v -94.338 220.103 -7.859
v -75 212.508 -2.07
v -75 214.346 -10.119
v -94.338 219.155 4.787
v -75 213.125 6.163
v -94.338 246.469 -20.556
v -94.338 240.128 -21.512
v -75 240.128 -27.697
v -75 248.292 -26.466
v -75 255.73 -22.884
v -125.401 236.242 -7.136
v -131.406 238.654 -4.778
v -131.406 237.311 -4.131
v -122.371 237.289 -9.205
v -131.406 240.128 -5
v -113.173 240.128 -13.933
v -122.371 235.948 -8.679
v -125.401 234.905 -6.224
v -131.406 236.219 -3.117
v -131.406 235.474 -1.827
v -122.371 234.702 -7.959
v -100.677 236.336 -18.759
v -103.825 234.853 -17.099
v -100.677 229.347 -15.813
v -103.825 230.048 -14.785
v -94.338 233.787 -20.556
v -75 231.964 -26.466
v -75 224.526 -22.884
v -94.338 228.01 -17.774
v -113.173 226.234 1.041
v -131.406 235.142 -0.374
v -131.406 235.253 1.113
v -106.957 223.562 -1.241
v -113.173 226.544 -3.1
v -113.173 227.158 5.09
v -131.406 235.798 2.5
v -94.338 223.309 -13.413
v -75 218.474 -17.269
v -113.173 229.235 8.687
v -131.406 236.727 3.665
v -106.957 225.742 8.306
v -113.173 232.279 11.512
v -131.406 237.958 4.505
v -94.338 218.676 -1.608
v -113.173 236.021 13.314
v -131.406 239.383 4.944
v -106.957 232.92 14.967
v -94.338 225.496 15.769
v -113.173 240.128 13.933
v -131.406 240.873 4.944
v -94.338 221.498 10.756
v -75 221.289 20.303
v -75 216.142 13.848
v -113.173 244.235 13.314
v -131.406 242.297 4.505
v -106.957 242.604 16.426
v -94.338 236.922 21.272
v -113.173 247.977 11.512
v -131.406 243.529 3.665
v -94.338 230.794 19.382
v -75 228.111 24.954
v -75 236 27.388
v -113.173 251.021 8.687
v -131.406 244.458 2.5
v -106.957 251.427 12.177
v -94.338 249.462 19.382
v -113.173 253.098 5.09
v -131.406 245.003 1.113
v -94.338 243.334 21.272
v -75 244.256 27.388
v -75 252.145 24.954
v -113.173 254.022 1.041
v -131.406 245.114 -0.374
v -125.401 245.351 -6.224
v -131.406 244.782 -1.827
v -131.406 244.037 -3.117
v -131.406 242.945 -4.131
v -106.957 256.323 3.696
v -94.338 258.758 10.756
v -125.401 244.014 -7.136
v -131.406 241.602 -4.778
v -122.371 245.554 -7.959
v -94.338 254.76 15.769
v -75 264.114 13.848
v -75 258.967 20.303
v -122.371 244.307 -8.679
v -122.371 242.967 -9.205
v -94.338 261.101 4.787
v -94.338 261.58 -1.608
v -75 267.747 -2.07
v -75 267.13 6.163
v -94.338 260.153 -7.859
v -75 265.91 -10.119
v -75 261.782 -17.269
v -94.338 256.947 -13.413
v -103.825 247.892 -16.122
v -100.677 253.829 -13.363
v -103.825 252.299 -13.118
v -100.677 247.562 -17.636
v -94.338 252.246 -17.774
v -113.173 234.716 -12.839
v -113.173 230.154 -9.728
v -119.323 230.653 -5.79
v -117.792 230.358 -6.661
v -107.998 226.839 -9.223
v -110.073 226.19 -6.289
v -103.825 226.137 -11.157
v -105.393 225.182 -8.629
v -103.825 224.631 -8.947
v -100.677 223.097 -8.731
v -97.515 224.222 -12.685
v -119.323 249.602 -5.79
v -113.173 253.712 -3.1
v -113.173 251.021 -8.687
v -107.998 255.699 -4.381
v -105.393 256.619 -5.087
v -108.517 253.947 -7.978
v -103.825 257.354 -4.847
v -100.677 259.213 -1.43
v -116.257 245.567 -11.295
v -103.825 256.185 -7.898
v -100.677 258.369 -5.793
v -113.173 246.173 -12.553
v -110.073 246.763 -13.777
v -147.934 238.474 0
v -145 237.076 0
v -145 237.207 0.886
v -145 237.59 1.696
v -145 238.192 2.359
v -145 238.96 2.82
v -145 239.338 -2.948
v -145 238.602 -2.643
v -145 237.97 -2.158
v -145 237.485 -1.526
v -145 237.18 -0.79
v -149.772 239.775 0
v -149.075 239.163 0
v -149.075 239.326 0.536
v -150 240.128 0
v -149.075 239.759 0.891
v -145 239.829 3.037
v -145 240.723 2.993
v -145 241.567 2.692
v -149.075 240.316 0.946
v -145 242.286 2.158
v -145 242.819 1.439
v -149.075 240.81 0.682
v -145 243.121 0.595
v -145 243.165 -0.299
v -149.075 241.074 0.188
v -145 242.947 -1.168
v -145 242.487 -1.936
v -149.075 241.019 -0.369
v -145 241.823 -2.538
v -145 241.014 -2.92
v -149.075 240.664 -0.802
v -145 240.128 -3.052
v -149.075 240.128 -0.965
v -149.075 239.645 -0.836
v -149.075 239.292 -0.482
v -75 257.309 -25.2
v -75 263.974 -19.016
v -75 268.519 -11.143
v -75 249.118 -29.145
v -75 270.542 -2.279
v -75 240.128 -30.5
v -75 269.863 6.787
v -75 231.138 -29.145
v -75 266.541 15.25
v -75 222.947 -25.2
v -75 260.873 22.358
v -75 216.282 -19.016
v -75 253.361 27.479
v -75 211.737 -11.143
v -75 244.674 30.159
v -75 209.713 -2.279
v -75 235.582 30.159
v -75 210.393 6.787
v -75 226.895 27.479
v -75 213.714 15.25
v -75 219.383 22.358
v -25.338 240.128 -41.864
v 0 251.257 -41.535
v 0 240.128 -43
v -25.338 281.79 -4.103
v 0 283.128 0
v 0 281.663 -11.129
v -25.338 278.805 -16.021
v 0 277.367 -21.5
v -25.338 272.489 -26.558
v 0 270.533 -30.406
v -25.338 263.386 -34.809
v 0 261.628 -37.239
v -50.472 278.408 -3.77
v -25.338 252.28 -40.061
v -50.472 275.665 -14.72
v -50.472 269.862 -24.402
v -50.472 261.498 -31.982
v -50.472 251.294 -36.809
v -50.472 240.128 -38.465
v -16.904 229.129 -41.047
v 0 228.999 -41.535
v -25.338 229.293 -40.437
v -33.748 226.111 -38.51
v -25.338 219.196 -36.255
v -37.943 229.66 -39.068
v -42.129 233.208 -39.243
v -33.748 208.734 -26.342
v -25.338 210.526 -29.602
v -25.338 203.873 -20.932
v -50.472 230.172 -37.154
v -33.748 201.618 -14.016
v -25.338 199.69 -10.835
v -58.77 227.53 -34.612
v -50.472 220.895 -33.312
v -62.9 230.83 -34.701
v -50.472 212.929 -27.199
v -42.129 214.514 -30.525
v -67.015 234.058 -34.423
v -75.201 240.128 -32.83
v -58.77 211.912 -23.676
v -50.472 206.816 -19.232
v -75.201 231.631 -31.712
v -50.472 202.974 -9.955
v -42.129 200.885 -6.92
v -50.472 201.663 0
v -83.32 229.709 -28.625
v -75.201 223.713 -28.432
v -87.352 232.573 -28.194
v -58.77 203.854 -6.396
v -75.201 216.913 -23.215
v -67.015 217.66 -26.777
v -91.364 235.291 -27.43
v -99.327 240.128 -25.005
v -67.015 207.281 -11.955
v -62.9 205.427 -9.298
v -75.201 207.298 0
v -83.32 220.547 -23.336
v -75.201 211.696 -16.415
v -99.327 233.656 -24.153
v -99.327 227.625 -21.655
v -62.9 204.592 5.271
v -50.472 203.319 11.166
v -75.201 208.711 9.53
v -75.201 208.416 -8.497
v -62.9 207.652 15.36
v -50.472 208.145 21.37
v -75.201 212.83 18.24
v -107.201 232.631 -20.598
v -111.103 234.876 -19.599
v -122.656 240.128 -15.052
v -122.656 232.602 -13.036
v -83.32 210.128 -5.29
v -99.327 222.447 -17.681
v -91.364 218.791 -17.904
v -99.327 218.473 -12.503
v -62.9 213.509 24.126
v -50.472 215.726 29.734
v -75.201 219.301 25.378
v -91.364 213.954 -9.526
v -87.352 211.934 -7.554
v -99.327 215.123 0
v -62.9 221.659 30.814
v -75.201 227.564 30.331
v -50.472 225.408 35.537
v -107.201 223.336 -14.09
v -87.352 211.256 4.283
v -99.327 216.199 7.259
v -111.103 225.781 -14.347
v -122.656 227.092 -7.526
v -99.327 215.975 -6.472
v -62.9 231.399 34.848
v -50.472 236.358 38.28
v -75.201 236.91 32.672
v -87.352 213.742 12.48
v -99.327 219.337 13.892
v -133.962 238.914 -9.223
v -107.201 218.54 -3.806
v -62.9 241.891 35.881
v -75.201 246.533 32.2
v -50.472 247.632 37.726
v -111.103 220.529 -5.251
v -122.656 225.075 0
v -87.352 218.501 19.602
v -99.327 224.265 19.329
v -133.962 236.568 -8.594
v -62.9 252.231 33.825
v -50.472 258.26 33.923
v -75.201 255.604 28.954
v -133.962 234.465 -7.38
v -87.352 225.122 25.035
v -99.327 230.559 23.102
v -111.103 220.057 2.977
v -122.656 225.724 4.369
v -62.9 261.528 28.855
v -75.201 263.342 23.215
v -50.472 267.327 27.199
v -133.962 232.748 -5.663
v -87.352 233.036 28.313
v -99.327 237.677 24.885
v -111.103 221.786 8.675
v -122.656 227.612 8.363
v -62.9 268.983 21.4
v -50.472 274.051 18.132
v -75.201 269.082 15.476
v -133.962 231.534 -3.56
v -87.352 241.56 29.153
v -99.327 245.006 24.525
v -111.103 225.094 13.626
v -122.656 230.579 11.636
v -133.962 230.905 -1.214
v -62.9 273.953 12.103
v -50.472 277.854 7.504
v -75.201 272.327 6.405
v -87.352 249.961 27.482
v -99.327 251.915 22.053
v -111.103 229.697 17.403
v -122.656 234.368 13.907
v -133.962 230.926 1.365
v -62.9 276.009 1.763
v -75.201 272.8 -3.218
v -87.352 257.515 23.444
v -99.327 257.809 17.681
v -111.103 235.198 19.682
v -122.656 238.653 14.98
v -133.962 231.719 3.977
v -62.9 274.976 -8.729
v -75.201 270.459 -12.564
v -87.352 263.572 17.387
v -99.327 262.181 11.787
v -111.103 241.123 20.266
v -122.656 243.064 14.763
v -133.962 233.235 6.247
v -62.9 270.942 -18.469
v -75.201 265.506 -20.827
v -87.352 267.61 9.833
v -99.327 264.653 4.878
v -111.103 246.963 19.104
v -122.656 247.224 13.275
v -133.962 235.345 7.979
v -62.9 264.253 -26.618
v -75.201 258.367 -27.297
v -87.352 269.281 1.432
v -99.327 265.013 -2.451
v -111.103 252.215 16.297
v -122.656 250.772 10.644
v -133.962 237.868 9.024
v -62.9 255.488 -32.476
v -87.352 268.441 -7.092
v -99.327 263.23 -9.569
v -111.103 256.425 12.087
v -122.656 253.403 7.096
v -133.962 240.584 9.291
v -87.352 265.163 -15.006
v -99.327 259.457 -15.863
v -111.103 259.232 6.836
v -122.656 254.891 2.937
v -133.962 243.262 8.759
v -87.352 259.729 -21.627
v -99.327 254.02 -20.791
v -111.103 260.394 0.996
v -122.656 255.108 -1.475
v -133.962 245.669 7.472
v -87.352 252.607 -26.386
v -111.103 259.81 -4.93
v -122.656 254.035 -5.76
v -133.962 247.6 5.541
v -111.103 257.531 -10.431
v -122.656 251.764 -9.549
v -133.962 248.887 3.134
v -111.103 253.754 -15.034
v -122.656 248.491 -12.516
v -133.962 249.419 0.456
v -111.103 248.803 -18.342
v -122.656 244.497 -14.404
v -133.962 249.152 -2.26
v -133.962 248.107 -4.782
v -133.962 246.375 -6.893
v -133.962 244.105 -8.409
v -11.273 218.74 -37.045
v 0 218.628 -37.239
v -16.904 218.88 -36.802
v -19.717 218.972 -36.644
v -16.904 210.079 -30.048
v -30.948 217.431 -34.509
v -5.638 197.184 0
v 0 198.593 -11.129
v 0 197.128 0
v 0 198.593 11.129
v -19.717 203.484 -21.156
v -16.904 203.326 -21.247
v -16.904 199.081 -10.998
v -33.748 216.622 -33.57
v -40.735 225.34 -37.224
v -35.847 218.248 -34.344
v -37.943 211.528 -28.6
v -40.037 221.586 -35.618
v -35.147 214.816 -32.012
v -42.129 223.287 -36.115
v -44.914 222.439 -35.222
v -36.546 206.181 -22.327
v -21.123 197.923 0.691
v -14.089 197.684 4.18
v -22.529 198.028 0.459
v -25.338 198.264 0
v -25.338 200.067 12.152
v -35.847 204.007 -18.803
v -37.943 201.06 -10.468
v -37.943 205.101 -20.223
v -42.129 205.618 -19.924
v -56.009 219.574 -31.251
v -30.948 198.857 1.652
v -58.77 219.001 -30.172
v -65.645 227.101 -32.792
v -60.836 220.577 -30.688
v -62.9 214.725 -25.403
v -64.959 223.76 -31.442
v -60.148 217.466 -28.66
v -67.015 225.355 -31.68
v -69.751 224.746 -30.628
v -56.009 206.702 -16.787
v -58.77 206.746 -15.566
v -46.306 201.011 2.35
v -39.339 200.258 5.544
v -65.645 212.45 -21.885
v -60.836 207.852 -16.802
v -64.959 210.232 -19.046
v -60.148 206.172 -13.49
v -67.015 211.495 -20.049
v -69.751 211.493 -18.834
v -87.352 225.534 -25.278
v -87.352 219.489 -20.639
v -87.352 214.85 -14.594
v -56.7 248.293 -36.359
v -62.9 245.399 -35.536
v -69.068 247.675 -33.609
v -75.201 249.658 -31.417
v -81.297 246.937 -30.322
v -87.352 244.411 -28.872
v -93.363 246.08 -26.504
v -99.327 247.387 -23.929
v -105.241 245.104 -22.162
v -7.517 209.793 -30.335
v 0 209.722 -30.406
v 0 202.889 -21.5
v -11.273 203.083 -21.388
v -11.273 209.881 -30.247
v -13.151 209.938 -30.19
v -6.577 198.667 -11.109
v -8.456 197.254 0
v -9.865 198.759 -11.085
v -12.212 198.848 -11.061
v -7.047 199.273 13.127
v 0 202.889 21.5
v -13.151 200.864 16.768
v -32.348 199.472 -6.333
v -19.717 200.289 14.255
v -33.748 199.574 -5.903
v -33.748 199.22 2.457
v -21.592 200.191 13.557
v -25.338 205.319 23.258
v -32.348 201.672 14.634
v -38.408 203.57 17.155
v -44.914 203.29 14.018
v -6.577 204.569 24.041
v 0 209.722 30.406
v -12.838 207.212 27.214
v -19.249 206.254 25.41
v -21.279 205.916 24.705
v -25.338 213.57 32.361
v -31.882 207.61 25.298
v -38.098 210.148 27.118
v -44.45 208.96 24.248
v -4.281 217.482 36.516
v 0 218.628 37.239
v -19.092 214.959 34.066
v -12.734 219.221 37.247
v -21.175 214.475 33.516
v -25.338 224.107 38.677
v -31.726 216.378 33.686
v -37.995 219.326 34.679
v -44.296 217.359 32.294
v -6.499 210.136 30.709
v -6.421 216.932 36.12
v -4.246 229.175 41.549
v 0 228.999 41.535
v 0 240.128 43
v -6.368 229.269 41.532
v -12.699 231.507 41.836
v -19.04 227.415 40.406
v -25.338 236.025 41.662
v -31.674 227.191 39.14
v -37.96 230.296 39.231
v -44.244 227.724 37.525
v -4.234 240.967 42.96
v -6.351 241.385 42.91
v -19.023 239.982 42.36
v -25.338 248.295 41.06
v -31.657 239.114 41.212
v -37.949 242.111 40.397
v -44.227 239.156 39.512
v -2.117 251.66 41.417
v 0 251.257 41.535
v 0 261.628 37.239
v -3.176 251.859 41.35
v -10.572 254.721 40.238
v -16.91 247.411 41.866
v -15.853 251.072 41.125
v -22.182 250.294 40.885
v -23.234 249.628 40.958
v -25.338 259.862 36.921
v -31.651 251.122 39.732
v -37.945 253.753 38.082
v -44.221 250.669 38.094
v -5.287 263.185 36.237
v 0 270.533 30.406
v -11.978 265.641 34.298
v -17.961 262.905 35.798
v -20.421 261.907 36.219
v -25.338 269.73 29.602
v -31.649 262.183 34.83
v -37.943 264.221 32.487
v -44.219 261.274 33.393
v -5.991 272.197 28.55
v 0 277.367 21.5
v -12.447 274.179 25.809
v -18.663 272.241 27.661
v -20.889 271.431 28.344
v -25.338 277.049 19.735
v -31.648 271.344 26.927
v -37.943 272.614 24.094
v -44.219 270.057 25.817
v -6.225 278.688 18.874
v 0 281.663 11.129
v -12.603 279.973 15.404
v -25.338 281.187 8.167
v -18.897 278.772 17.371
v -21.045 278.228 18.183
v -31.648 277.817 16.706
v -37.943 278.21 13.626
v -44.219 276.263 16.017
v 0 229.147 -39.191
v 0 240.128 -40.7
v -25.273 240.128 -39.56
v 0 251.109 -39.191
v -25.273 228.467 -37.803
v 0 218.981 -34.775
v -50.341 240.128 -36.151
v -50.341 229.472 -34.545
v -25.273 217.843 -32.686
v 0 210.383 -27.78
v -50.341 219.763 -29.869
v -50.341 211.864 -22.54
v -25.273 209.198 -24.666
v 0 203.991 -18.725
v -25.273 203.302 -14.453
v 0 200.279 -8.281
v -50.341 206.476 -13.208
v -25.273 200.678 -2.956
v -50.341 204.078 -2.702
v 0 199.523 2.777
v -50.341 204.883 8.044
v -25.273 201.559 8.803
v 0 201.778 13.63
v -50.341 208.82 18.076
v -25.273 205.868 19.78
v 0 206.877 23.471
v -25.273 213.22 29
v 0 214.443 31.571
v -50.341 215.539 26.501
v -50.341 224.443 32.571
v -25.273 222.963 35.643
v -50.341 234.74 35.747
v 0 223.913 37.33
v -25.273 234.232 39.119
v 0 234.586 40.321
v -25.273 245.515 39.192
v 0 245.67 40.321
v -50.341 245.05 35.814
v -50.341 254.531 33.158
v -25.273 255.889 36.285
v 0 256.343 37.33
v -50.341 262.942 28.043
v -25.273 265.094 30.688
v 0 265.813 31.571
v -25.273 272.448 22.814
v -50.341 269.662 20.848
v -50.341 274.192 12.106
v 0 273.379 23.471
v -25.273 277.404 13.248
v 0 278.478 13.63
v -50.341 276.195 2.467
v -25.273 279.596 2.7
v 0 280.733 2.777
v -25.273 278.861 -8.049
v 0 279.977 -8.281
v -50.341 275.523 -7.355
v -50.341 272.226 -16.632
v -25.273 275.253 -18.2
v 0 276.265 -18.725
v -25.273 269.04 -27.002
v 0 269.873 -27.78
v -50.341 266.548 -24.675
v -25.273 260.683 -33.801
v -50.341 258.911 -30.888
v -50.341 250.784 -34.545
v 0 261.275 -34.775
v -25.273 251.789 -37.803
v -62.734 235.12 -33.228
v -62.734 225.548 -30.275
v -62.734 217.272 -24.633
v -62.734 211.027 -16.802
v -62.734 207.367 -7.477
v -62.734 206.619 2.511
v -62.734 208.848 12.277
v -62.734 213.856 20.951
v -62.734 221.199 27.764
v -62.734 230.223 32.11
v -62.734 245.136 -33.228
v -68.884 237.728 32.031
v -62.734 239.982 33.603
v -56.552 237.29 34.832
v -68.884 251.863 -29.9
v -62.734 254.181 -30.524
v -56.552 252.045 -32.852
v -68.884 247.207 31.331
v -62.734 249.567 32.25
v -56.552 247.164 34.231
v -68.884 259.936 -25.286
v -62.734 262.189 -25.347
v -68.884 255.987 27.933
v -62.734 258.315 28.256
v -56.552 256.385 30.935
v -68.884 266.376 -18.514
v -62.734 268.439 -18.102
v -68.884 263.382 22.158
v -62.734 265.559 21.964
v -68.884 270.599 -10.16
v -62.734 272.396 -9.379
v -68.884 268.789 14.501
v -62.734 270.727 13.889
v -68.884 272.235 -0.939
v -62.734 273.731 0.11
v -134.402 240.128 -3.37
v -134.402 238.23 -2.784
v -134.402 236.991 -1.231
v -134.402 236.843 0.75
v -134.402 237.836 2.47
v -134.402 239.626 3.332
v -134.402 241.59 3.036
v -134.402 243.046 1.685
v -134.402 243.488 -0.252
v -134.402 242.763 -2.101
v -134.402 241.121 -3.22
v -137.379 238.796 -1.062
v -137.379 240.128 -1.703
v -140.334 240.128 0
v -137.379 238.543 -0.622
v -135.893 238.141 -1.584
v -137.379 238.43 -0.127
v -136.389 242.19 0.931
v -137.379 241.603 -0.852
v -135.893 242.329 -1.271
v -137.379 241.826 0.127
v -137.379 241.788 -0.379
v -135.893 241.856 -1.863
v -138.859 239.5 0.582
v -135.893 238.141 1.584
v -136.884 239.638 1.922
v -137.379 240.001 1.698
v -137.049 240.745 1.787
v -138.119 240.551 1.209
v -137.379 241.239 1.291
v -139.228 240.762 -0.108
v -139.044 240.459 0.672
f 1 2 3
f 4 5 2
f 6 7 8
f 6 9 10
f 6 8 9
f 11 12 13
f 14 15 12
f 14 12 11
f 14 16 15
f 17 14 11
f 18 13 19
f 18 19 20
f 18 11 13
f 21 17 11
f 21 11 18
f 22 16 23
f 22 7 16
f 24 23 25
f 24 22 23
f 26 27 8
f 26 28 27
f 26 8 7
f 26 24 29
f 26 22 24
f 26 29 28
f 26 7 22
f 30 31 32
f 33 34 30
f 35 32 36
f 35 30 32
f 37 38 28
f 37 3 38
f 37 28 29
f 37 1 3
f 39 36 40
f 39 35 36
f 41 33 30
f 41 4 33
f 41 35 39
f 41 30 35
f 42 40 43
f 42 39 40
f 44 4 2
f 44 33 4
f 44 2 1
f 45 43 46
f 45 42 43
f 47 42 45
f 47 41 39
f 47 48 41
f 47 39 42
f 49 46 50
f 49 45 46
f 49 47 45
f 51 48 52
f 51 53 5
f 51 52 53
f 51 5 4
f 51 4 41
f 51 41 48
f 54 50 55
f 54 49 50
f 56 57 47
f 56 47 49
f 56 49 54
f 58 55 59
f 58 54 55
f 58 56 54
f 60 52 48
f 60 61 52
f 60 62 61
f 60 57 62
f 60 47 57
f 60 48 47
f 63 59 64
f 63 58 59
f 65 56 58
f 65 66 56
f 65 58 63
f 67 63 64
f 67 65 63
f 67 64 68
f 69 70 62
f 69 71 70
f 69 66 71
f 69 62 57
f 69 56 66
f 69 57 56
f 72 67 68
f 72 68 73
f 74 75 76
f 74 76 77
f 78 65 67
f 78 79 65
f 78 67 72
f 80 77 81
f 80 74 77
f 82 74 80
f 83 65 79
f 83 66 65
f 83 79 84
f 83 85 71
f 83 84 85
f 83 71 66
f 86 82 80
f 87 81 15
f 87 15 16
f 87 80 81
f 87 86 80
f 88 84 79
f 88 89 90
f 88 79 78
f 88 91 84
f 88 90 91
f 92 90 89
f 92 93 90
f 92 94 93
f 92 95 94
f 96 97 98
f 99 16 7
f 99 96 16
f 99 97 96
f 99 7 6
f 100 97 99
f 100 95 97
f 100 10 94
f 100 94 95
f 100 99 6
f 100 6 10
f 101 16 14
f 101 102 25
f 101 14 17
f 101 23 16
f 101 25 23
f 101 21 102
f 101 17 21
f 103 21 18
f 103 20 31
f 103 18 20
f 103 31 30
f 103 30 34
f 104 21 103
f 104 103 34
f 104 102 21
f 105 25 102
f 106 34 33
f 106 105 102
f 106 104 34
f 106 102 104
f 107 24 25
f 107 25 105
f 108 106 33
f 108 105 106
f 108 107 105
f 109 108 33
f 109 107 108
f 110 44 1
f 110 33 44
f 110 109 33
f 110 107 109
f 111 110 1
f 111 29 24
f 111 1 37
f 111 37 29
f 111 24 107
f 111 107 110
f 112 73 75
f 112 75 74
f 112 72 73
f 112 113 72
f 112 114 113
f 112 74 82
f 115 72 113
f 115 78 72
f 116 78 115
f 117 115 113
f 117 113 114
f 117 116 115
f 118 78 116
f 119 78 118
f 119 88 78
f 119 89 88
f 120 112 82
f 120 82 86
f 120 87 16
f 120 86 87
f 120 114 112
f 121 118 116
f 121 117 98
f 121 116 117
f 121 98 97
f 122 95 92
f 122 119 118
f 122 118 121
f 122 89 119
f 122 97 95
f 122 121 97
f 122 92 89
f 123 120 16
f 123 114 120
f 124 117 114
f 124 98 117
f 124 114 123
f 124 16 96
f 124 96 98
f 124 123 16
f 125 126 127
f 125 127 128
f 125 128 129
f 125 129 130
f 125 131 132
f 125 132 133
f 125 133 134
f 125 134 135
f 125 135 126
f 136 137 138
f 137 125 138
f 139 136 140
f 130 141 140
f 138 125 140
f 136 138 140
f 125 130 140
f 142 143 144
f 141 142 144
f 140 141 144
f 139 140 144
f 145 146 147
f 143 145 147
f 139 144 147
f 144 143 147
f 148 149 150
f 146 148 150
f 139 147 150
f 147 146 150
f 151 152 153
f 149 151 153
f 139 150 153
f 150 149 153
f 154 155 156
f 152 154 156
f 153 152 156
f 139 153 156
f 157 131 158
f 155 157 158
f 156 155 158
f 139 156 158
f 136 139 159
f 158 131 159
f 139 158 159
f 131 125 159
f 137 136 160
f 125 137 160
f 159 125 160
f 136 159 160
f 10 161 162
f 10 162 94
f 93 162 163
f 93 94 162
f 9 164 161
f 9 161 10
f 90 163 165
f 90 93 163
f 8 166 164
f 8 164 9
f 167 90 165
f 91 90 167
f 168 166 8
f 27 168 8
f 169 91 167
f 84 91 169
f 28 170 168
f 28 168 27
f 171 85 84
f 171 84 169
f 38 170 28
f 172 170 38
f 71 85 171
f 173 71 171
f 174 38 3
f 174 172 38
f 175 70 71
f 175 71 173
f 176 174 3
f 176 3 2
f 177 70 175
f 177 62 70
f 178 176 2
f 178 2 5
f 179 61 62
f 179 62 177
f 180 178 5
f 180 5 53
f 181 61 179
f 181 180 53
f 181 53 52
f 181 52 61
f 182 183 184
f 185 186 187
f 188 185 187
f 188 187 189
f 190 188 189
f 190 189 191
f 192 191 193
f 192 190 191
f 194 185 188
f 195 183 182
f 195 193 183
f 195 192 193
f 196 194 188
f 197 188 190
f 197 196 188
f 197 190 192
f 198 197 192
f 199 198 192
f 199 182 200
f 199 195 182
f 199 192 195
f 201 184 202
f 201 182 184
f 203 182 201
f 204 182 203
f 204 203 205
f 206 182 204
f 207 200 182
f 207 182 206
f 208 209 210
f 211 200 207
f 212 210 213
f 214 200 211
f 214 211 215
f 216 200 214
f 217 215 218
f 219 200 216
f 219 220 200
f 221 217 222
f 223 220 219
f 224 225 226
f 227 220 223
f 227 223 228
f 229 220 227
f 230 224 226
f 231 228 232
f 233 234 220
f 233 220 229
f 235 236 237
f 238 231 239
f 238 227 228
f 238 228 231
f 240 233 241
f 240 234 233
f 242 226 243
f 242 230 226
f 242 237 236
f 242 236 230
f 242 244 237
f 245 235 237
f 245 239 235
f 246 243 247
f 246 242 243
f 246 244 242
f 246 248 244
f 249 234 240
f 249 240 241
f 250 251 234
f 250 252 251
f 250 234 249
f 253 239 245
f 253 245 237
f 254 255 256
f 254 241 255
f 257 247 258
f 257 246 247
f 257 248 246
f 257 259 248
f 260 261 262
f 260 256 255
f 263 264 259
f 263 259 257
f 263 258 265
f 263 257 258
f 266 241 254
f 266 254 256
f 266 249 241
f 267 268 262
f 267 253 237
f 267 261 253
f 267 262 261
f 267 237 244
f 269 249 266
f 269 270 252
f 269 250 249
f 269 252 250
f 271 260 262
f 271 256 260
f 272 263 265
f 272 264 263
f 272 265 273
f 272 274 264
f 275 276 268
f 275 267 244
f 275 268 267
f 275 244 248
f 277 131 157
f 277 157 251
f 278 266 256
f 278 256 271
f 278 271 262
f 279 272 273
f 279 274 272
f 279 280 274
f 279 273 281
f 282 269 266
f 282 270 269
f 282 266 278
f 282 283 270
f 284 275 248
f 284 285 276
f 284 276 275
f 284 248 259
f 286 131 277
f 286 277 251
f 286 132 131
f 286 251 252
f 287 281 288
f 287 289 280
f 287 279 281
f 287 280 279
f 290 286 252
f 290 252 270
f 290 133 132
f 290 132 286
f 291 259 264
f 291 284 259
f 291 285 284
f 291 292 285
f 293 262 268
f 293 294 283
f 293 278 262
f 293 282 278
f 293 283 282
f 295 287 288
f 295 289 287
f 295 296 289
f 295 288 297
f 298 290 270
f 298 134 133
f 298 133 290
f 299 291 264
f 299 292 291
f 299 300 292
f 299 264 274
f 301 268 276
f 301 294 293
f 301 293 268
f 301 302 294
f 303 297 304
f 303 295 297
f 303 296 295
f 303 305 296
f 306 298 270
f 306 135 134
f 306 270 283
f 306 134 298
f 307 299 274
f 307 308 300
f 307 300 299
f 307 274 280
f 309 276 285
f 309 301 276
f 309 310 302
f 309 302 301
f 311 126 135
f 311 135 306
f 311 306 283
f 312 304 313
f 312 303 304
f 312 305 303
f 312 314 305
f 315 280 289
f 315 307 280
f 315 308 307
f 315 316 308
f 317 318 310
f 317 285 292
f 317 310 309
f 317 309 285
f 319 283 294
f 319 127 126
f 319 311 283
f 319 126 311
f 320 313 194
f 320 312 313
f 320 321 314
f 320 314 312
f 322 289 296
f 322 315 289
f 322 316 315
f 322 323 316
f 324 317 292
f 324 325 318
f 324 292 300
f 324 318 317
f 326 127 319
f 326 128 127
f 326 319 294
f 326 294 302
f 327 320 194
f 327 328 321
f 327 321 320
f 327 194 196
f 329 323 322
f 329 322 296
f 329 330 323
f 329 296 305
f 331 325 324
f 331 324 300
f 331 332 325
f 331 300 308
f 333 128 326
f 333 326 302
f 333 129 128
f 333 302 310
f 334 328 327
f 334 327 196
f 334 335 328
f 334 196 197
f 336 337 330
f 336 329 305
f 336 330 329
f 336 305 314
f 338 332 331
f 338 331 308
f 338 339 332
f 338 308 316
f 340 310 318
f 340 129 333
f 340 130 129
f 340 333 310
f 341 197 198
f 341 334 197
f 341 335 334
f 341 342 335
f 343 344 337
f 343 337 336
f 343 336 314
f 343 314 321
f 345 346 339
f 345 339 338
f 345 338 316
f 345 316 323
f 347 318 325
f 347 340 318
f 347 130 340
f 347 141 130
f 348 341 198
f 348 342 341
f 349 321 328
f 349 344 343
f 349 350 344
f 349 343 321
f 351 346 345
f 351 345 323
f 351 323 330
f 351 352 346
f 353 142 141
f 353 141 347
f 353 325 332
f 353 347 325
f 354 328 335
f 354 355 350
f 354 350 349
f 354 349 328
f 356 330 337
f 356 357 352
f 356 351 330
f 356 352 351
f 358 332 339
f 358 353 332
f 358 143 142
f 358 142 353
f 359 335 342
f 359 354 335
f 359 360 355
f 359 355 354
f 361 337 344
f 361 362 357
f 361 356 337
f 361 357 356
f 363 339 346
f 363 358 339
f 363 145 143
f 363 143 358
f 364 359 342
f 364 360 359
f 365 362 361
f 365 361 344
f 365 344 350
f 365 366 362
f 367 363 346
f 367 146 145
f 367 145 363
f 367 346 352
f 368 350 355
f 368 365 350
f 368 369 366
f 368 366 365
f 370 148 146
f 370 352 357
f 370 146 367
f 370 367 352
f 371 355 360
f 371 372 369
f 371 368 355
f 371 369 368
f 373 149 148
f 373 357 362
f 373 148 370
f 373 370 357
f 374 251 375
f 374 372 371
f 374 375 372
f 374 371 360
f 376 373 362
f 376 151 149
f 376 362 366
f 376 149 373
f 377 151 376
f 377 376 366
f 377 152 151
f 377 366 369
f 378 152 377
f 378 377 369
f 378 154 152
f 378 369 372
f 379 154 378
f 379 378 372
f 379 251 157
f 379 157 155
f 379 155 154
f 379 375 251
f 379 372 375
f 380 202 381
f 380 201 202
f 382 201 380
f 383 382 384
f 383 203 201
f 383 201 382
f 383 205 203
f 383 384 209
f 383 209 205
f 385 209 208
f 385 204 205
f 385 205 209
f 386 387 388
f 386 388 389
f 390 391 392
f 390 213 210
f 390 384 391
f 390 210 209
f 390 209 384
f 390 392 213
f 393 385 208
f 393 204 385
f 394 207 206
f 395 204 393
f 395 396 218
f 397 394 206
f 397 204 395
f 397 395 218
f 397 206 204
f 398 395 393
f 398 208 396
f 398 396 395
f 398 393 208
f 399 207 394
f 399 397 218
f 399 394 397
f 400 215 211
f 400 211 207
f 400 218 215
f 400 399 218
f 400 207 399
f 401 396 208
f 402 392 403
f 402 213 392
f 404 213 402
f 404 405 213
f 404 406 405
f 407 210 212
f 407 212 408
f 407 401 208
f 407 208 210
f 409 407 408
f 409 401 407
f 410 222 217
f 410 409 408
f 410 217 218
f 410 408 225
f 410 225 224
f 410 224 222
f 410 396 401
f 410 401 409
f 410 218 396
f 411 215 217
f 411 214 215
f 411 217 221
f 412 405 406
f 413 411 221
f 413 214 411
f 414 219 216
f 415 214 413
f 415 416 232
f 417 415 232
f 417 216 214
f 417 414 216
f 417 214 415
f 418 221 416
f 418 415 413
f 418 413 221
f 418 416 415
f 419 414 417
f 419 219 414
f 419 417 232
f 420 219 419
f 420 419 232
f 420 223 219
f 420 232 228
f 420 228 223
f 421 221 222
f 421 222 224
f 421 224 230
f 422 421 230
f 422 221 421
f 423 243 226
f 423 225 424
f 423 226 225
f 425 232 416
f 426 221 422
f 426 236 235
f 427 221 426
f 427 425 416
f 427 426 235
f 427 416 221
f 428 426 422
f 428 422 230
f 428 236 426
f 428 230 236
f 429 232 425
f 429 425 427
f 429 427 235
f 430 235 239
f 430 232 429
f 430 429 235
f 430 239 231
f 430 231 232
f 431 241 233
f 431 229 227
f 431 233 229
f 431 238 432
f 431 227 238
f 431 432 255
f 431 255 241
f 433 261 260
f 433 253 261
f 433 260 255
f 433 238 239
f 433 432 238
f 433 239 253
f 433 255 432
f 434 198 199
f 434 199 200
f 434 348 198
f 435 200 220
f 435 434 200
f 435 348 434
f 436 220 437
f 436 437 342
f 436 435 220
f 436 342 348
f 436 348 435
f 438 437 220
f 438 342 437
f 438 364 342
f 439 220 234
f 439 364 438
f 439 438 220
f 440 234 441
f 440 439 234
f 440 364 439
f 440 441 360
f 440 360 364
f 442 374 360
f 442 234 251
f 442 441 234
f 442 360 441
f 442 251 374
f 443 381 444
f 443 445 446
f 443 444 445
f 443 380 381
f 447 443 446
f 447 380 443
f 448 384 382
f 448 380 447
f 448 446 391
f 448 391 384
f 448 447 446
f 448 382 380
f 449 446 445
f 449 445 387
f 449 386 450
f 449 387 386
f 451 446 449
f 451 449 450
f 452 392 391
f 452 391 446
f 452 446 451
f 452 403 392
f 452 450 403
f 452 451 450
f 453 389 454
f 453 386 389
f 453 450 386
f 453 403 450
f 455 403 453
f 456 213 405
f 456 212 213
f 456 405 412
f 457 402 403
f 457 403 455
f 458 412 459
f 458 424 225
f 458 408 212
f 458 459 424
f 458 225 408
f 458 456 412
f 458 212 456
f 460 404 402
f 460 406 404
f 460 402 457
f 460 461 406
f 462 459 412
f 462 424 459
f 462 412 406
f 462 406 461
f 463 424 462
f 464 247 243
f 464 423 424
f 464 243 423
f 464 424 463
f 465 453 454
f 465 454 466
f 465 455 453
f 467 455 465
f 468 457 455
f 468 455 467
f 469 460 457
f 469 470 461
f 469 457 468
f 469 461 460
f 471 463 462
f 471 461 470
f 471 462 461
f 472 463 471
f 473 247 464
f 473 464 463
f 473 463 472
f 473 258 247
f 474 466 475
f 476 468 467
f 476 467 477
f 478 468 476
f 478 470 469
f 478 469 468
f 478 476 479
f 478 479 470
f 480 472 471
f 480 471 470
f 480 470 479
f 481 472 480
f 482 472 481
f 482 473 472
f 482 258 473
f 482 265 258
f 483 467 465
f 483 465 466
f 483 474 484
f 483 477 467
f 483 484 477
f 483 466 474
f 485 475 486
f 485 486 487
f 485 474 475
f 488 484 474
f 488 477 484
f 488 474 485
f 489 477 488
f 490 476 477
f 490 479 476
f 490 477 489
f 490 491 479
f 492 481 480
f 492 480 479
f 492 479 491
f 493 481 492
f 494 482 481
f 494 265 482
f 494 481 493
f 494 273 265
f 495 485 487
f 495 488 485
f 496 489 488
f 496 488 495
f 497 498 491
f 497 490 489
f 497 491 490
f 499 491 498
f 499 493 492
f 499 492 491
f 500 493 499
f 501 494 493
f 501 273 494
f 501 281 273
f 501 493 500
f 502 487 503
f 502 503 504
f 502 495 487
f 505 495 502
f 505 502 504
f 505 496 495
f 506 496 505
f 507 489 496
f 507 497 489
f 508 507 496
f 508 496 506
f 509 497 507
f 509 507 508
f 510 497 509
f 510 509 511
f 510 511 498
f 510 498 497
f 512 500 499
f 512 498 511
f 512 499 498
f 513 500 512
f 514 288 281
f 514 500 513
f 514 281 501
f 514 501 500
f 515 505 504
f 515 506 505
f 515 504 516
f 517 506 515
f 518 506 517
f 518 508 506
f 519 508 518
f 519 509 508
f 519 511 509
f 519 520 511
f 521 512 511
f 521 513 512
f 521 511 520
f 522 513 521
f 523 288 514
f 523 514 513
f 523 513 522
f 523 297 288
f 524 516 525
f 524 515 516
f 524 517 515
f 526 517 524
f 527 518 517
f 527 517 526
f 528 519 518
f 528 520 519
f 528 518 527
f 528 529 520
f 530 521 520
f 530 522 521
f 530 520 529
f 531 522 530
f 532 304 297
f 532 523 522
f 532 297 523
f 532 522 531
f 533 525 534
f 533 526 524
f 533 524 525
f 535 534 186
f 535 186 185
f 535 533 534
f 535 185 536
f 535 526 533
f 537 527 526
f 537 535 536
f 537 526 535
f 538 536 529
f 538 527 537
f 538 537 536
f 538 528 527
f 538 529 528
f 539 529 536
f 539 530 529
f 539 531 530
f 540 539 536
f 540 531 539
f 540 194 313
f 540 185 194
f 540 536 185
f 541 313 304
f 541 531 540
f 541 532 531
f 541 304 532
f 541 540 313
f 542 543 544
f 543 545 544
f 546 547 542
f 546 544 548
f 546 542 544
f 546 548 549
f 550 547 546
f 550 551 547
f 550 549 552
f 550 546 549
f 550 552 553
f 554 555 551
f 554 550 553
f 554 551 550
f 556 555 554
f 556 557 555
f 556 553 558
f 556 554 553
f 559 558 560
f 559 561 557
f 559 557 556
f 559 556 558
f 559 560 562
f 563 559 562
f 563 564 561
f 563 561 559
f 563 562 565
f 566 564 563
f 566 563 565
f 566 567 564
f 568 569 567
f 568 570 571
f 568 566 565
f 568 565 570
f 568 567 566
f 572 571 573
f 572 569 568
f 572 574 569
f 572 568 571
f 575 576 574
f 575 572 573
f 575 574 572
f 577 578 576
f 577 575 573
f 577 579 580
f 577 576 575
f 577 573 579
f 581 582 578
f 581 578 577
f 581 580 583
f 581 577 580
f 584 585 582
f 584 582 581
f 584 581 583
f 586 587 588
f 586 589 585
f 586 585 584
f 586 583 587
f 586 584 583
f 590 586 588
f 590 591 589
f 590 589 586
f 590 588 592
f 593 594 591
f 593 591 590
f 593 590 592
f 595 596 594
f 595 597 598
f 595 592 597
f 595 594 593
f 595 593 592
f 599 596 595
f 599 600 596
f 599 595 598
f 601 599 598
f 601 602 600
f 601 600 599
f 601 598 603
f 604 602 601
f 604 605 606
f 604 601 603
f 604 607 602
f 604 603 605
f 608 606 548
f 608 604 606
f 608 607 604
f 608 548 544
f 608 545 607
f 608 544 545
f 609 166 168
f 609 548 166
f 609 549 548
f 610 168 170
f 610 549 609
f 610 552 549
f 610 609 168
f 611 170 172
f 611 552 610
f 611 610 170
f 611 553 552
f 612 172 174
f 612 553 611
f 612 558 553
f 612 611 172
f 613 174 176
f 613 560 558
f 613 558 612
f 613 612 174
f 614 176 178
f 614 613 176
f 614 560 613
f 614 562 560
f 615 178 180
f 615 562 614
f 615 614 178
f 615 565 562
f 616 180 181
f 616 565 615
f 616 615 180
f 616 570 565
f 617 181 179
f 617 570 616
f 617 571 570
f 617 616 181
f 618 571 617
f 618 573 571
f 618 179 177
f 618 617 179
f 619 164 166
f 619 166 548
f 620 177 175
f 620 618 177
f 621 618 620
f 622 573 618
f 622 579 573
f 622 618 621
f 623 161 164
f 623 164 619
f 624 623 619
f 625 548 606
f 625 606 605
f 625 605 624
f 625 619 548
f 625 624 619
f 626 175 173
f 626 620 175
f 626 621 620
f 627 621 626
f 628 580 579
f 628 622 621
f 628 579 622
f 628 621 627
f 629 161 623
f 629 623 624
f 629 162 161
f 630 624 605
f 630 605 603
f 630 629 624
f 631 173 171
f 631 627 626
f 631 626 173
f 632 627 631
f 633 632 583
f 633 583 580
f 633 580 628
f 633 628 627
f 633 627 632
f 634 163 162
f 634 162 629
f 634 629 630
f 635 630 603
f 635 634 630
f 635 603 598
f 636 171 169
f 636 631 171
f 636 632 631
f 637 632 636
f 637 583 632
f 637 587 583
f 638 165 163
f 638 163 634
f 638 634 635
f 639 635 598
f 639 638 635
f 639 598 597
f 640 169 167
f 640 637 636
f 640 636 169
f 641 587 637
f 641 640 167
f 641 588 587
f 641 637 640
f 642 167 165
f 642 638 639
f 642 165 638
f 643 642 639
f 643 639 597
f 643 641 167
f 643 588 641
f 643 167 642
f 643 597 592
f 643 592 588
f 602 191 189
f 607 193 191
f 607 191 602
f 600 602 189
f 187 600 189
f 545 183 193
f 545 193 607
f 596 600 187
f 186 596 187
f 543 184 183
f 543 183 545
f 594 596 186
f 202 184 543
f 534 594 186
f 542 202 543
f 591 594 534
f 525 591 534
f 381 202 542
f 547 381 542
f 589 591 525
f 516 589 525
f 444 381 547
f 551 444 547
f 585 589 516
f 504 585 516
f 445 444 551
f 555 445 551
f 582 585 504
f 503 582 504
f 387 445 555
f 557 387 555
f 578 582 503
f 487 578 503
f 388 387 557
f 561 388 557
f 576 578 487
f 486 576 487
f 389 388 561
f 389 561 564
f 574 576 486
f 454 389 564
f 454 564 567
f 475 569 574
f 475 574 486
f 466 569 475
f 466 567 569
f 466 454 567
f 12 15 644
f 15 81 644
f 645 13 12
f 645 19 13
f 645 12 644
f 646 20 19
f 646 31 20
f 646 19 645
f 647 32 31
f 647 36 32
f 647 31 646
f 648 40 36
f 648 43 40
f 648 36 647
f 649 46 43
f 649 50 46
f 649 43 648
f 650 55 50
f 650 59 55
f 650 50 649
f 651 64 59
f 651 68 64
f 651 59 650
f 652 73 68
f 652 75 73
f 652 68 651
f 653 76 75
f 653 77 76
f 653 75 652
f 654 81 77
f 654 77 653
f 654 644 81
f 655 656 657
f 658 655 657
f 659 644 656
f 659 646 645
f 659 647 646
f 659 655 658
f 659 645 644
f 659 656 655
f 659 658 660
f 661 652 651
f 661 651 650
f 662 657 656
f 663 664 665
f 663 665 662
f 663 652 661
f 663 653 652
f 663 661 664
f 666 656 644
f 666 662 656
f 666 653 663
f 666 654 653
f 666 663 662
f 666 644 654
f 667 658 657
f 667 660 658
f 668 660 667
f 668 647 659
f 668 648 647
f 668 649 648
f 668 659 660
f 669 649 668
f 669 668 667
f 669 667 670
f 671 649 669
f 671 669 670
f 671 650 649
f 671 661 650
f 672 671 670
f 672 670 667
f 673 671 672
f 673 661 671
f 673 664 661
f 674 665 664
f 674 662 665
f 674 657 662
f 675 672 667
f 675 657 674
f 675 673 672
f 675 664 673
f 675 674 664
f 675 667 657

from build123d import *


with BuildPart() as part:
    # Sketch1 → Revolve1 (revolve)
    with BuildSketch(Plane.XY, mode=Mode.PRIVATE) as revolve1_sk:
        with BuildLine():
            ThreePointArc((0, 283.127906977), (-78.020830552, 272.165687972), (-150, 240.127906977))
            Line((-150, 240.127906977), (-140.334318434, 240.127906977))
            ThreePointArc((-140.334318434, 240.127906977), (-135.892976509, 242.668975303), (-131.405638617, 245.127906977))
            ThreePointArc((-131.405638617, 245.127906977), (-103.824897521, 258.022330999), (-75, 267.824817071))
            Line((-75, 267.824817071), (-75, 270.627628554))
            ThreePointArc((-75, 270.627628554), (-37.845229818, 278.266153021), (0, 280.827906977))
            Line((0, 280.827906977), (0, 283.127906977))
        make_face()
    revolve(revolve1_sk.sketch.rotate(Axis((-150, 240.127906977, 0), (-1, 0, 0)), 90), axis=Axis((-150, 240.127906977, 0), (-1, 0, 0)))

    # Sketch2 → Cut-Revolve1 (revolve, cut)
    with BuildSketch(Plane.XY, mode=Mode.PRIVATE) as cut_revolve1_sk:
        with BuildLine():
            Line((-150, 240.127906977), (-145, 240.127906977))
            Line((-145, 240.127906977), (-145, 243.17979297))
            ThreePointArc((-145, 243.17979297), (-147.507893016, 241.666781348), (-150, 240.127906977))
        make_face()
    revolve(cut_revolve1_sk.sketch.rotate(Axis((-150, 240.127906977, 0), (1, 0, 0)), 180), axis=Axis((-150, 240.127906977, 0), (1, 0, 0)), mode=Mode.SUBTRACT)

    # Sketch4 → Revolve2 (revolve)
    with BuildSketch(Plane.XY, mode=Mode.PRIVATE) as revolve2_sk:
        with BuildLine():
            Line((-145, 240.127906977), (-150, 240.127906977))
            add(Edge.make_bspline(
                [(-150, 240.127906977), (-149.571591748, 241.095083065), (-147.476516829, 242.062259153), (-145, 243.17979297)],
                knots=[0.5, 0.5, 0.5, 0.5, 1, 1, 1, 1], degree=3))
            Line((-145, 243.17979297), (-145, 240.127906977))
        make_face()
    revolve(revolve2_sk.sketch.rotate(Axis((-145, 240.127906977, 0), (-1, 0, 0)), 180), axis=Axis((-145, 240.127906977, 0), (-1, 0, 0)))


solid = part.part
